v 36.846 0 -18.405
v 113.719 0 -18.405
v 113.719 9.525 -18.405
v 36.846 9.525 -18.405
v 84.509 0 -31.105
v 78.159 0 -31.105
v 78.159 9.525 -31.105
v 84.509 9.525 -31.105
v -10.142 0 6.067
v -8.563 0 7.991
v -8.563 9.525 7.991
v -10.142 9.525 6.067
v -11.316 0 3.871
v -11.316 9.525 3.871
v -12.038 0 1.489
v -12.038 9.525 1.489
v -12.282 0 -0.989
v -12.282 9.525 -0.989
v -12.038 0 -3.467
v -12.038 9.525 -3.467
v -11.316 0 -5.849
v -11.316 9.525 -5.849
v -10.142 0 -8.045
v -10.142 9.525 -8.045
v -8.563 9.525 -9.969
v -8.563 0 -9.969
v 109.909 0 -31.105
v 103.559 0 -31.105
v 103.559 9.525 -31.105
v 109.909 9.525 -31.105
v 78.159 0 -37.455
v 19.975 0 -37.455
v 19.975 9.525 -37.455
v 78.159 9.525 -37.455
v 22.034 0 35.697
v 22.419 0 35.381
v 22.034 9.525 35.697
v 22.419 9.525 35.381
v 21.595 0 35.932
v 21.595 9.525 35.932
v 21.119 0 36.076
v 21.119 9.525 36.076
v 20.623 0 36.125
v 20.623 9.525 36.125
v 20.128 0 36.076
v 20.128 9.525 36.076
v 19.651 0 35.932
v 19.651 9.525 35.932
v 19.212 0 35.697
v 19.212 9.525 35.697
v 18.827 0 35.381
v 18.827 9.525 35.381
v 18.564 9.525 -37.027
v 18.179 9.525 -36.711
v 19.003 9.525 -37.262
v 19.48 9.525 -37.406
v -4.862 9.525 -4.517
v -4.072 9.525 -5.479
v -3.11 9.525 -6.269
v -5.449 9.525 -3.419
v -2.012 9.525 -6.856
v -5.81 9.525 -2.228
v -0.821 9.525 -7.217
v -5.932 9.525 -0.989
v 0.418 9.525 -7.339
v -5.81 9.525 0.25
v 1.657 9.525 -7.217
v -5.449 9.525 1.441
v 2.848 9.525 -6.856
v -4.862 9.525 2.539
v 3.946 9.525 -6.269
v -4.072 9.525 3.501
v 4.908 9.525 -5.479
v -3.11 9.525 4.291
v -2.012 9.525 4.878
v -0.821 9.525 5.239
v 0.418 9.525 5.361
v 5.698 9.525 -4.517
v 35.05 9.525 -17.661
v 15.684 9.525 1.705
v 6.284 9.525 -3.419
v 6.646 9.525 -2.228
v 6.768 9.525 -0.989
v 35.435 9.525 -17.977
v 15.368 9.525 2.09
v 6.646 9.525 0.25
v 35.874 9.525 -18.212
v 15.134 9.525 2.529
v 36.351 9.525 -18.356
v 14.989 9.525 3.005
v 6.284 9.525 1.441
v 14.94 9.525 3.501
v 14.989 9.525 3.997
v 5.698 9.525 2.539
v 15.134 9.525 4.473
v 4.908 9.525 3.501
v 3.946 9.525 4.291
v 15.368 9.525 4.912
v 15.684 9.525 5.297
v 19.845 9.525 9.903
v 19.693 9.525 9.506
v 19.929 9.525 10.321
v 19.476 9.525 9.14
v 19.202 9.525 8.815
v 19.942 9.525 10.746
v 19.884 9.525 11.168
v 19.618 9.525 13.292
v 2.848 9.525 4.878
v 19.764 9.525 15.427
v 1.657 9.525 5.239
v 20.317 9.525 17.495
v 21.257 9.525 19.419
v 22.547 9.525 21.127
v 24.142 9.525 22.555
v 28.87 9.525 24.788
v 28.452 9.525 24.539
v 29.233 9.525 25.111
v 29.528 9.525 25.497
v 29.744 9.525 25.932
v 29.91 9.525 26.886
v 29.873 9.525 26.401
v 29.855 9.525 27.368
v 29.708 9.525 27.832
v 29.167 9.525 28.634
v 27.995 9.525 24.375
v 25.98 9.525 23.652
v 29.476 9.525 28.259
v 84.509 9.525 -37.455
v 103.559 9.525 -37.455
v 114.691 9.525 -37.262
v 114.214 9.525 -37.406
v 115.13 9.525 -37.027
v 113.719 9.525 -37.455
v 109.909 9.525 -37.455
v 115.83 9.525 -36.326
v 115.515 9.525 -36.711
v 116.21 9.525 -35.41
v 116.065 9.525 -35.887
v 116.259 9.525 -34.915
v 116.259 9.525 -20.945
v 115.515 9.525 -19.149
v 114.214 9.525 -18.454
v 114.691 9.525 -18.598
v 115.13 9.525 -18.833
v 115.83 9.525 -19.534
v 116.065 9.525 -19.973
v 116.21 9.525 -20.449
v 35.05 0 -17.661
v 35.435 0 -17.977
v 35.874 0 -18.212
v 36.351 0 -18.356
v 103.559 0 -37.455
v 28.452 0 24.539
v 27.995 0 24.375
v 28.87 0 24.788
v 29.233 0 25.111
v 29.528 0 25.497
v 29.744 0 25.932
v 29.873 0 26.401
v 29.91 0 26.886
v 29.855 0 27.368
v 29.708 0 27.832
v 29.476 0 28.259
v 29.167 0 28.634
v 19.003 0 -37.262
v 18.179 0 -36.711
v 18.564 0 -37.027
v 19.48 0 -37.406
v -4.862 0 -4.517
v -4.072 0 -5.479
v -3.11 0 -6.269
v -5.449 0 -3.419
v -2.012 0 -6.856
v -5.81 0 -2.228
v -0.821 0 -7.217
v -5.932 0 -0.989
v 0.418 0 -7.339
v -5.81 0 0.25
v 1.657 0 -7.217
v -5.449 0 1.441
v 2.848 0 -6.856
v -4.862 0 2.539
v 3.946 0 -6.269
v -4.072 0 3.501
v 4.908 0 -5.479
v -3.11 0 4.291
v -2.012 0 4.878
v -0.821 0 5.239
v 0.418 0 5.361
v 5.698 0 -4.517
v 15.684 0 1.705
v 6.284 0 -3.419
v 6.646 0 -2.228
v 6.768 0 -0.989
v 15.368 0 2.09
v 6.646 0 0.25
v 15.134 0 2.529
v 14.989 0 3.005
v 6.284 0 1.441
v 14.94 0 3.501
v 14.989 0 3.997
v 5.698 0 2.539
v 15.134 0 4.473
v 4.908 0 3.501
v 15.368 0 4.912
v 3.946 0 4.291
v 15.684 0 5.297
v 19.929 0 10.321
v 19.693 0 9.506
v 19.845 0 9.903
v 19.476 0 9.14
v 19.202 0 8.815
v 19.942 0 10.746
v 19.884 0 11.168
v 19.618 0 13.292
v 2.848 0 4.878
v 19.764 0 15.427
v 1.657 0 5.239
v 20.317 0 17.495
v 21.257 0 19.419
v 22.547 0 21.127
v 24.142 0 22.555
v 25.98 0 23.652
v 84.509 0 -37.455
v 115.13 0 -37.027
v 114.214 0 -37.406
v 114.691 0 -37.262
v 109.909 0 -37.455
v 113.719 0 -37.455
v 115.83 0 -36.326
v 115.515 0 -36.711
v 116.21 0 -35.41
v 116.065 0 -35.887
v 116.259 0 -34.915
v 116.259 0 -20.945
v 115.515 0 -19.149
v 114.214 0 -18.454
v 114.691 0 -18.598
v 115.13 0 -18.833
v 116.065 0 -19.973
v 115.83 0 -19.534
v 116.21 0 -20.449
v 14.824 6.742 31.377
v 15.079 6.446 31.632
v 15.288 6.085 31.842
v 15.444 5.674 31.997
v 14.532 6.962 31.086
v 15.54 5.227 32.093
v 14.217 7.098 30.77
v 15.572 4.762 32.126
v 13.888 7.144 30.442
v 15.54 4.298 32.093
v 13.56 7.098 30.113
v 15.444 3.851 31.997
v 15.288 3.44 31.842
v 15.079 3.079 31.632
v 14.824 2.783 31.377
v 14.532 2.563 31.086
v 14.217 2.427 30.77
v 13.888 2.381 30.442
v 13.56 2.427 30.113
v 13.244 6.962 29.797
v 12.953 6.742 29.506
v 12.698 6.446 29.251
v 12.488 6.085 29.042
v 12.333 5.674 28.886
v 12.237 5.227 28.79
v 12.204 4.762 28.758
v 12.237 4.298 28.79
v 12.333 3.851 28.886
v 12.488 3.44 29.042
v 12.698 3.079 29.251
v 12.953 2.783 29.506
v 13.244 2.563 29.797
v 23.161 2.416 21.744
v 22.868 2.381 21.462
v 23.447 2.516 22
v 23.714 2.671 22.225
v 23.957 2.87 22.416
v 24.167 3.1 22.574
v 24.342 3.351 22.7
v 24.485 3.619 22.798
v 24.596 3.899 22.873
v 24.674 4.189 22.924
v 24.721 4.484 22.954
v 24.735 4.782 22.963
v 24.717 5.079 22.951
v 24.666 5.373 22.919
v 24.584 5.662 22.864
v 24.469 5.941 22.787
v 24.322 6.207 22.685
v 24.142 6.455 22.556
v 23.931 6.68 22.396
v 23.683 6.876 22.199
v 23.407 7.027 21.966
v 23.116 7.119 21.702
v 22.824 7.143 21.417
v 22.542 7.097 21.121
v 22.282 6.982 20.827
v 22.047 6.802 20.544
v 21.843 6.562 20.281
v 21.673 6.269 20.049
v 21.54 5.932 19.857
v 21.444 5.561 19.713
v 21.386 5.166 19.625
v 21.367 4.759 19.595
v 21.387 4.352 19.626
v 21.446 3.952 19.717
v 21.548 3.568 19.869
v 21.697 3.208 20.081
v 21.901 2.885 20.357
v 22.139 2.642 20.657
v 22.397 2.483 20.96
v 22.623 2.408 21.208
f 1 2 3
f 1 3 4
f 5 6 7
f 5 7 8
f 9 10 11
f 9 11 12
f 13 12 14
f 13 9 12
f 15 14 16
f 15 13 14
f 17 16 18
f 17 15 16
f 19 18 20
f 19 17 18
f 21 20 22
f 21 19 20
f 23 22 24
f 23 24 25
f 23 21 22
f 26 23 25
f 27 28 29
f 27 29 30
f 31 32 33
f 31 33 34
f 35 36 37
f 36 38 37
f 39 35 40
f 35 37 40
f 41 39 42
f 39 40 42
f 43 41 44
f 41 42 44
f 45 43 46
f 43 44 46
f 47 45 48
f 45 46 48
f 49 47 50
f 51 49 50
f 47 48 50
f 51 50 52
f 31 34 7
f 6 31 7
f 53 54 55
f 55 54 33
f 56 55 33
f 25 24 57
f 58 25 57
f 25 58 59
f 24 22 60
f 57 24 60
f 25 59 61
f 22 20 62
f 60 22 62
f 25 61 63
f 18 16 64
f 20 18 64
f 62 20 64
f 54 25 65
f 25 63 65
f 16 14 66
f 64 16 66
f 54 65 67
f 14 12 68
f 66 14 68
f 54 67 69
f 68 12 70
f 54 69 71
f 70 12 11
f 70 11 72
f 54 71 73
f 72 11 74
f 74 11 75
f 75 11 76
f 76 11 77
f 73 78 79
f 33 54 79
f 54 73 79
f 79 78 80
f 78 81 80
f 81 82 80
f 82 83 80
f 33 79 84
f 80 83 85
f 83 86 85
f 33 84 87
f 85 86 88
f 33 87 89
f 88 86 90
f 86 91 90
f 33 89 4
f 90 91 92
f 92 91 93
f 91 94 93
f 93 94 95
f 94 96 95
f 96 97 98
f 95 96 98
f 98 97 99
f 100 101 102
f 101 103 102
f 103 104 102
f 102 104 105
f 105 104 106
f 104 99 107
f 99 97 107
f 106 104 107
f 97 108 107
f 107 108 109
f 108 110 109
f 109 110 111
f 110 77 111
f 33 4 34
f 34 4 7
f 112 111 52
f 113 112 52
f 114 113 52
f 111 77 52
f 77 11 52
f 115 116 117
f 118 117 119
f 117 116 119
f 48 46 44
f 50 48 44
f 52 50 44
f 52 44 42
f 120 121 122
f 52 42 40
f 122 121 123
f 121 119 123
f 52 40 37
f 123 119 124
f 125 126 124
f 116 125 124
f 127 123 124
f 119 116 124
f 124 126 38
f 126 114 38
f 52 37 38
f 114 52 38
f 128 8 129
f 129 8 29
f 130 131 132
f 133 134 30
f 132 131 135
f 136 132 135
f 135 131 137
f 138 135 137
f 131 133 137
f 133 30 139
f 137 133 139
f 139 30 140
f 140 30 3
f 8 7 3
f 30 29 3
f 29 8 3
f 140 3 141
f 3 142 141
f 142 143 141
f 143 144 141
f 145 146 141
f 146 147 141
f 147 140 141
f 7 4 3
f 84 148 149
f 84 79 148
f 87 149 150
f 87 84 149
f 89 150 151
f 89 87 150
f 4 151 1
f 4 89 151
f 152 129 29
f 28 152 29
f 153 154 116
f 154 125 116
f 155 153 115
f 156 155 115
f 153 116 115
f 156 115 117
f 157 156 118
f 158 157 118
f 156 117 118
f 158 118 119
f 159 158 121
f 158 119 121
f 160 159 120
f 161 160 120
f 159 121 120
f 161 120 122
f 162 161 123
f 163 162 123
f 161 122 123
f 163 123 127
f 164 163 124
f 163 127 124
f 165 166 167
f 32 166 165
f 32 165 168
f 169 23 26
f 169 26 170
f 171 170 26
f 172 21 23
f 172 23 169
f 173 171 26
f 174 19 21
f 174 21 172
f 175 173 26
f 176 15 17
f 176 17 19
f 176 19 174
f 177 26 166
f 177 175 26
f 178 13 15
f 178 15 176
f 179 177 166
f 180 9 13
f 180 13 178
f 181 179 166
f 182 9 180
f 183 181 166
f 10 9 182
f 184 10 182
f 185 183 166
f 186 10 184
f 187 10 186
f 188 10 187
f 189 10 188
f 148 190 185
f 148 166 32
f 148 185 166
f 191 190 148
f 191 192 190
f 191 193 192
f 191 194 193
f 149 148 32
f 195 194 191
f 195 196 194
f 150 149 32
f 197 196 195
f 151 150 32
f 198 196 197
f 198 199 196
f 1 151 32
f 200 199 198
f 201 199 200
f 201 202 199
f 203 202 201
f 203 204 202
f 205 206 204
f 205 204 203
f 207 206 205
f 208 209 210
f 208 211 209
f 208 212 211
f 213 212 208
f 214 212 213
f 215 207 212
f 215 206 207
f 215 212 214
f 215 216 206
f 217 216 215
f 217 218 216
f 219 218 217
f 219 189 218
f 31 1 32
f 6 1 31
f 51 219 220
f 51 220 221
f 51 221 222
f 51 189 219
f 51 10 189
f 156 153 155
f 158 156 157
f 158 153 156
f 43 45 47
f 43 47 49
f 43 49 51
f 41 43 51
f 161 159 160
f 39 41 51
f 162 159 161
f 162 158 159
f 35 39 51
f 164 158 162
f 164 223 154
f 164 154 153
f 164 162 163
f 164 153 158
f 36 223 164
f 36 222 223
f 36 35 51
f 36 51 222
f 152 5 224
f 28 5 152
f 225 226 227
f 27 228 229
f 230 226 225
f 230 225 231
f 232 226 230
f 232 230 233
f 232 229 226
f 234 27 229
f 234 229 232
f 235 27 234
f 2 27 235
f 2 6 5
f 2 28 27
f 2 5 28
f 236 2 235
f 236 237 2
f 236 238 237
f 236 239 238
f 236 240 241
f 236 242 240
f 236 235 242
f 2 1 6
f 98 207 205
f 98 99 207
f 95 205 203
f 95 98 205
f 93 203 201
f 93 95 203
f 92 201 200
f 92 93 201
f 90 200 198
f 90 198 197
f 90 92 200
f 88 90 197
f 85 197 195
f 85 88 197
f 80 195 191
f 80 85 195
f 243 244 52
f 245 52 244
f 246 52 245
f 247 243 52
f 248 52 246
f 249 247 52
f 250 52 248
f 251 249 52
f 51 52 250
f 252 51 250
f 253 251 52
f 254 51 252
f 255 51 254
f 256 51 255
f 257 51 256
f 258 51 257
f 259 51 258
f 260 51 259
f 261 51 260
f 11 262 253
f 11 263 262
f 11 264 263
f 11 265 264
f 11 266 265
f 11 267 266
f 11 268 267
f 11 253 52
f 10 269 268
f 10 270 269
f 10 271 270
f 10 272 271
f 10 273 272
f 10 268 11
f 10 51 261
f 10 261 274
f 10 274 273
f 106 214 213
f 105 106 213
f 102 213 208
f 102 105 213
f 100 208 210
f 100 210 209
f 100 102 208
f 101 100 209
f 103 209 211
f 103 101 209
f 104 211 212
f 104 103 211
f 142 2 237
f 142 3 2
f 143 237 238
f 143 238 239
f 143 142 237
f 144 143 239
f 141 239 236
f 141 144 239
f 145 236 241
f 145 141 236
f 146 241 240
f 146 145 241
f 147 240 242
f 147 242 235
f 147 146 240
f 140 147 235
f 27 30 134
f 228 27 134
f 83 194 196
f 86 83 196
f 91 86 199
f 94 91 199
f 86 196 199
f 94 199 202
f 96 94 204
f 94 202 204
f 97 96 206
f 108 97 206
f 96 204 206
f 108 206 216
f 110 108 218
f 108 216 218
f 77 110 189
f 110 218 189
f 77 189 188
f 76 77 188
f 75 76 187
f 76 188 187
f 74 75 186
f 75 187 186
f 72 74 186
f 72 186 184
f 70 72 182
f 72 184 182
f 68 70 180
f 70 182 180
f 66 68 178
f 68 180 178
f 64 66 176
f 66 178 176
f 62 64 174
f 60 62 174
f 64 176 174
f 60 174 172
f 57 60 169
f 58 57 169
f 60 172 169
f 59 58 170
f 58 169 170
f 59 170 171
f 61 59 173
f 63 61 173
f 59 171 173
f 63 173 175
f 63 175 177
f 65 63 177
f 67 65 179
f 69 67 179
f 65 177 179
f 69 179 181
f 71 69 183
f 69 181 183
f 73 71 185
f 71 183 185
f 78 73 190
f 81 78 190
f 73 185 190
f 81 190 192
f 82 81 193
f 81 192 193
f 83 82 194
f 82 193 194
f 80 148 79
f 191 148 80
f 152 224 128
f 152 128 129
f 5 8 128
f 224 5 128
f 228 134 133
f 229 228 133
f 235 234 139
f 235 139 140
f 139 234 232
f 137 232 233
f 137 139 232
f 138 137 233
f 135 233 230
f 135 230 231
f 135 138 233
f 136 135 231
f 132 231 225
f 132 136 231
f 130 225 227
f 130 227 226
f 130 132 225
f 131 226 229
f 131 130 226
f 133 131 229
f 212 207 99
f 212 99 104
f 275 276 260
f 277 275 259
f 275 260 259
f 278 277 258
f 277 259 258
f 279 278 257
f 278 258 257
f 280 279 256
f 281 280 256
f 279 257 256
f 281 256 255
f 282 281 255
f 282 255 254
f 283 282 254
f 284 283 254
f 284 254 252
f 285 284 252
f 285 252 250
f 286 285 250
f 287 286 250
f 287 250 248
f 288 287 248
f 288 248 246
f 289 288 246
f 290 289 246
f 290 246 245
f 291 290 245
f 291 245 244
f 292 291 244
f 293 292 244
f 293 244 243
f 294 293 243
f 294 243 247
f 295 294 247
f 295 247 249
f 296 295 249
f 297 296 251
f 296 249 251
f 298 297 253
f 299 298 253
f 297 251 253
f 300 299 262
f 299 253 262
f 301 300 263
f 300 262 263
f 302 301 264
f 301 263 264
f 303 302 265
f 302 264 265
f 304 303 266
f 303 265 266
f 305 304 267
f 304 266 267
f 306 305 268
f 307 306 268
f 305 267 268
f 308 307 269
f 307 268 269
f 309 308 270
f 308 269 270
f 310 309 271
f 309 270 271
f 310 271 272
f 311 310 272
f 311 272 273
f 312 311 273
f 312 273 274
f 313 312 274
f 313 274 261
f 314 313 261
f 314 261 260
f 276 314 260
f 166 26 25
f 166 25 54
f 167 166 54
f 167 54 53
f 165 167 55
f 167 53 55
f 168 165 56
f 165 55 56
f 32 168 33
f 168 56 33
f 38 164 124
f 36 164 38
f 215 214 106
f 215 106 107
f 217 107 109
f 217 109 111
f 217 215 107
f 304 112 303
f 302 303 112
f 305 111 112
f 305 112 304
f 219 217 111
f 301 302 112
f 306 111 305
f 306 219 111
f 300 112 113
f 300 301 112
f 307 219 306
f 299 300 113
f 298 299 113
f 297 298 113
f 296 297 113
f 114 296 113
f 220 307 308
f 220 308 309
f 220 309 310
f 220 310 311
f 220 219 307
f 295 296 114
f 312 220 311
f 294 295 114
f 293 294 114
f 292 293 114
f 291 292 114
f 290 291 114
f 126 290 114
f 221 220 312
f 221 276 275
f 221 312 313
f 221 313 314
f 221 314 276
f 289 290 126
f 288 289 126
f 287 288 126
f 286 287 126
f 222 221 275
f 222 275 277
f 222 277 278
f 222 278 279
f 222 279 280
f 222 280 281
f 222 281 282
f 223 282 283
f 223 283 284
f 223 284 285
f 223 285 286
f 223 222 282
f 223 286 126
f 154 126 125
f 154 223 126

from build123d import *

# Parameters (mm, degrees)
F0_R     = 6.35
F1_DEPTH = 9.525
F2_R     = 2.38125
F3_DEPTH = 25.4
F4_R     = 2.54
F5_R     = 2.54


with BuildPart() as f1:
    # F0 (on Front) → F1 (new body)
    with BuildSketch(Plane.XZ):
        with BuildLine():
            ThreePointArc((20.258996, 9.87189), (22.492237, 21.066453), (33.413953, 24.386349))
            Line((33.413953, 24.386349), (20.62332, 37.176983))
            Line((20.62332, 37.176983), (-8.562513, 7.99115))
            ThreePointArc((-8.562513, 7.99115), (-12.282257, -0.989106), (-8.562513, -9.969362))
            Line((-8.562513, -9.969362), (18.922999, -37.454874))
            Line((18.922999, -37.454874), (78.158512, -37.454874))
            Line((78.158512, -37.454874), (78.158512, -31.104874))
            Line((78.158512, -31.104874), (84.508512, -31.104874))
            Line((84.508512, -31.104874), (84.508512, -37.454874))
            Line((84.508512, -37.454874), (103.558512, -37.454874))
            Line((103.558512, -37.454874), (103.558512, -31.104874))
            Line((103.558512, -31.104874), (109.908512, -31.104874))
            Line((109.908512, -31.104874), (109.908512, -37.454874))
            Line((109.908512, -37.454874), (116.258512, -37.454874))
            Line((116.258512, -37.454874), (116.258512, -18.404874))
            Line((116.258512, -18.404874), (35.794024, -18.404874))
            Line((35.794024, -18.404874), (13.888128, 3.501022))
            Line((13.888128, 3.501022), (20.258996, 9.87189))
        make_face()
        with Locations((0.417743, -0.989106)):
            Circle(F0_R, mode=Mode.SUBTRACT)
    extrude(amount=-F1_DEPTH)

    # F2 (on face) → F3 (cut)
    with BuildSketch(Plane(origin=(-8.276832, 0, 8.276832), x_dir=(0, -1, 0), z_dir=(-0.707107, 0, 0.707107))):
        with Locations((-4.7625, 31.345986)):
            Circle(F2_R)
    extrude(amount=-F3_DEPTH, mode=Mode.SUBTRACT)

    # F4
    f4_edges = [f1.edges().sort_by_distance(p)[0] for p in [
        (33.413953, 4.7625, 24.386349),
        (20.258996, 4.7625, 9.87189),
    ]]
    fillet(f4_edges, radius=F4_R)

    # F5
    f5_edges = [f1.edges().sort_by_distance(p)[0] for p in [
        (13.888128, 4.7625, 3.501022),
        (35.794024, 4.7625, -18.404874),
        (18.922999, 4.7625, -37.454874),
        (116.258512, 4.7625, -18.404874),
        (116.258512, 4.7625, -37.454874),
        (20.62332, 4.7625, 37.176983),
    ]]
    fillet(f5_edges, radius=F5_R)


solid = f1.part
